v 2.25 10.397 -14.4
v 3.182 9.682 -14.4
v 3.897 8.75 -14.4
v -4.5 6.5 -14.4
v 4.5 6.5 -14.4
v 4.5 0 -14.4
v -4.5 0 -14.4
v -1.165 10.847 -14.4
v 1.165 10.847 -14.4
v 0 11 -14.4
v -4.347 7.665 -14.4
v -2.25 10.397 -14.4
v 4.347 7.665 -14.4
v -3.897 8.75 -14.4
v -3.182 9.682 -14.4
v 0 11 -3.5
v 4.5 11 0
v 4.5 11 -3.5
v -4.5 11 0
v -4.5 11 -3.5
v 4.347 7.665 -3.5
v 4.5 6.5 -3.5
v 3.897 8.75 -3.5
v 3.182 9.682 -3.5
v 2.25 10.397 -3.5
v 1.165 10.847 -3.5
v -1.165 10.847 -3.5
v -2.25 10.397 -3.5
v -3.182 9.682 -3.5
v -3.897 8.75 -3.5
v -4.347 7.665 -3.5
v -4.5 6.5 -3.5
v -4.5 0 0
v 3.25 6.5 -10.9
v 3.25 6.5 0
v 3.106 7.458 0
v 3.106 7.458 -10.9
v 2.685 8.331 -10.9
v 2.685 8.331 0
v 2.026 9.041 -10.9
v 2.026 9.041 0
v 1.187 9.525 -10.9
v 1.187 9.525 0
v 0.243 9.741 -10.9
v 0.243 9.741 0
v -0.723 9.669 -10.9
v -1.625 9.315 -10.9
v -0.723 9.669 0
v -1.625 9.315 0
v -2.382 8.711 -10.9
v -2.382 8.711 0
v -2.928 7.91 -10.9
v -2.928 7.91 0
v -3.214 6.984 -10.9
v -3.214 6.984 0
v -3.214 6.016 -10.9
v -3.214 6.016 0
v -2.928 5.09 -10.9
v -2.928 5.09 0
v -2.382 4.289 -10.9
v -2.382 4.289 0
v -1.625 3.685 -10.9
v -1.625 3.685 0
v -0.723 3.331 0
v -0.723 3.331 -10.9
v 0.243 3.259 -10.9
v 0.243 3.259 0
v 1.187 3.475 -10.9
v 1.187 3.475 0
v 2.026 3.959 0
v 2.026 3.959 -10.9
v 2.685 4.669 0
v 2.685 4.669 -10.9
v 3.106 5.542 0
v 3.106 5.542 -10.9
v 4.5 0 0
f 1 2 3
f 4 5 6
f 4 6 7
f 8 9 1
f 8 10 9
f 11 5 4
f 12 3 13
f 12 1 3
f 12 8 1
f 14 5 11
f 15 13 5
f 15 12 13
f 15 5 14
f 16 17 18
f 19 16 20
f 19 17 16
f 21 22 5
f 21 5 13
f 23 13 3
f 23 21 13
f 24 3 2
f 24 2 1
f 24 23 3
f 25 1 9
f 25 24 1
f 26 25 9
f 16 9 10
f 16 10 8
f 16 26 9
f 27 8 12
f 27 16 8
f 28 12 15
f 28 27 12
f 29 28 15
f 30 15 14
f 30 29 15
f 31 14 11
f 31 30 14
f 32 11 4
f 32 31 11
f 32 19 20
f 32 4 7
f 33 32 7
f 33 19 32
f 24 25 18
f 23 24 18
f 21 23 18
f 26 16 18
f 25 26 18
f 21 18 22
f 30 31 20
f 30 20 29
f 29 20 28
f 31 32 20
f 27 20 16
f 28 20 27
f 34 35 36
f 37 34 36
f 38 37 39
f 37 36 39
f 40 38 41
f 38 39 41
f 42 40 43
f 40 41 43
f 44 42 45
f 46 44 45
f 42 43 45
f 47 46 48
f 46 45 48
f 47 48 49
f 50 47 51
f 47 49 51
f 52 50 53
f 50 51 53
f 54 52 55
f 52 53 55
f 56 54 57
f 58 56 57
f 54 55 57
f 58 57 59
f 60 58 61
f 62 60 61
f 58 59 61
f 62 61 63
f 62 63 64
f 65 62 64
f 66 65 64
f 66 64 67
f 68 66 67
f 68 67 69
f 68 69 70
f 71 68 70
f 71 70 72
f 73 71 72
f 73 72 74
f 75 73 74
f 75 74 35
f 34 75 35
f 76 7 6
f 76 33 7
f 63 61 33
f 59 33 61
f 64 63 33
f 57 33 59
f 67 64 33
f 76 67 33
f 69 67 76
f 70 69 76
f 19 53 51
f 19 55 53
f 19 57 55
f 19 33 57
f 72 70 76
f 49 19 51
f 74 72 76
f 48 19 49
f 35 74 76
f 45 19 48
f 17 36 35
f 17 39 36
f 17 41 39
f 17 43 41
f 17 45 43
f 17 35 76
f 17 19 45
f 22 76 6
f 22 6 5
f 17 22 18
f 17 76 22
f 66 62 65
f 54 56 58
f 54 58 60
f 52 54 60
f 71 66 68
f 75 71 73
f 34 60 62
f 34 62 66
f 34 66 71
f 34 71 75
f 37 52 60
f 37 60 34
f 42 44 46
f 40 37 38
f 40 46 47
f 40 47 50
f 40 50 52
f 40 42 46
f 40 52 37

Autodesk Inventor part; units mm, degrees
ref_plane "YZ Plane" through (0, 0, 0) normal (1, 0, 0) x (0, 1, 0)
ref_plane "XZ Plane" through (0, 0, 0) normal (0, 1, 0) x (-1, 0, 0)
ref_plane "XY Plane" through (0, 0, 0) normal (0, 0, 1) x (1, 0, 0)
sketch "Sketch1" plane through (0, 0, 0) normal (0, 0, 1) x (1, 0, 0)
  line L0 (-4.5, 0) -> (4.5, 0)
  line L1 (4.5, 0) -> (4.5, 11)
  line L2 (4.5, 11) -> (-4.5, 11)
  line L3 (-4.5, 11) -> (-4.5, 0)
  line L4 (-4.5, 0) -> (4.5, 11) construction
  line L5 (4.5, 0) -> (-4.5, 11) construction
  point P0 (0, 0)
  point P1 (0, 5.5)
  dimension "d0" = 9
  dimension "d1" = 11
  dimension "d2" = 0
  dimension "d3" = 0
extrude "Extrusion1" add sketch "Sketch1" against normal blind 3.5
sketch "Sketch2" plane through (0, 0, -3.5) normal (0, 0, -1) x (-1, 0, 0)
  line L0 (-4.5, 0) -> (4.5, 0) projected
  line L1 (4.5, 0) -> (4.5, 11) projected
  line L2 (4.5, 11) -> (-4.5, 11) projected
  line L3 (-4.5, 11) -> (-4.5, 0) projected
  arc A0 (4.5, 6.5) -> (-4.5, 6.5) centre (0, 6.5) ccw
  point P0 (0, 0)
extrude "Extrusion2" add sketch "Sketch2" along normal blind 10.9 contours L3 A0 L1 L0
sketch "Sketch3" plane through (0, 0, 0) normal (0, 0, 1) x (1, 0, 0)
  circle A0 centre (0, 6.5) radius 3.25
  point P0 (0, 0)
  dimension "d8" = 6.5
  dimension "d9" = 6.5
extrude "Extrusion3" cut sketch "Sketch3" against normal blind 10.9
properties part number "pj-002b"
